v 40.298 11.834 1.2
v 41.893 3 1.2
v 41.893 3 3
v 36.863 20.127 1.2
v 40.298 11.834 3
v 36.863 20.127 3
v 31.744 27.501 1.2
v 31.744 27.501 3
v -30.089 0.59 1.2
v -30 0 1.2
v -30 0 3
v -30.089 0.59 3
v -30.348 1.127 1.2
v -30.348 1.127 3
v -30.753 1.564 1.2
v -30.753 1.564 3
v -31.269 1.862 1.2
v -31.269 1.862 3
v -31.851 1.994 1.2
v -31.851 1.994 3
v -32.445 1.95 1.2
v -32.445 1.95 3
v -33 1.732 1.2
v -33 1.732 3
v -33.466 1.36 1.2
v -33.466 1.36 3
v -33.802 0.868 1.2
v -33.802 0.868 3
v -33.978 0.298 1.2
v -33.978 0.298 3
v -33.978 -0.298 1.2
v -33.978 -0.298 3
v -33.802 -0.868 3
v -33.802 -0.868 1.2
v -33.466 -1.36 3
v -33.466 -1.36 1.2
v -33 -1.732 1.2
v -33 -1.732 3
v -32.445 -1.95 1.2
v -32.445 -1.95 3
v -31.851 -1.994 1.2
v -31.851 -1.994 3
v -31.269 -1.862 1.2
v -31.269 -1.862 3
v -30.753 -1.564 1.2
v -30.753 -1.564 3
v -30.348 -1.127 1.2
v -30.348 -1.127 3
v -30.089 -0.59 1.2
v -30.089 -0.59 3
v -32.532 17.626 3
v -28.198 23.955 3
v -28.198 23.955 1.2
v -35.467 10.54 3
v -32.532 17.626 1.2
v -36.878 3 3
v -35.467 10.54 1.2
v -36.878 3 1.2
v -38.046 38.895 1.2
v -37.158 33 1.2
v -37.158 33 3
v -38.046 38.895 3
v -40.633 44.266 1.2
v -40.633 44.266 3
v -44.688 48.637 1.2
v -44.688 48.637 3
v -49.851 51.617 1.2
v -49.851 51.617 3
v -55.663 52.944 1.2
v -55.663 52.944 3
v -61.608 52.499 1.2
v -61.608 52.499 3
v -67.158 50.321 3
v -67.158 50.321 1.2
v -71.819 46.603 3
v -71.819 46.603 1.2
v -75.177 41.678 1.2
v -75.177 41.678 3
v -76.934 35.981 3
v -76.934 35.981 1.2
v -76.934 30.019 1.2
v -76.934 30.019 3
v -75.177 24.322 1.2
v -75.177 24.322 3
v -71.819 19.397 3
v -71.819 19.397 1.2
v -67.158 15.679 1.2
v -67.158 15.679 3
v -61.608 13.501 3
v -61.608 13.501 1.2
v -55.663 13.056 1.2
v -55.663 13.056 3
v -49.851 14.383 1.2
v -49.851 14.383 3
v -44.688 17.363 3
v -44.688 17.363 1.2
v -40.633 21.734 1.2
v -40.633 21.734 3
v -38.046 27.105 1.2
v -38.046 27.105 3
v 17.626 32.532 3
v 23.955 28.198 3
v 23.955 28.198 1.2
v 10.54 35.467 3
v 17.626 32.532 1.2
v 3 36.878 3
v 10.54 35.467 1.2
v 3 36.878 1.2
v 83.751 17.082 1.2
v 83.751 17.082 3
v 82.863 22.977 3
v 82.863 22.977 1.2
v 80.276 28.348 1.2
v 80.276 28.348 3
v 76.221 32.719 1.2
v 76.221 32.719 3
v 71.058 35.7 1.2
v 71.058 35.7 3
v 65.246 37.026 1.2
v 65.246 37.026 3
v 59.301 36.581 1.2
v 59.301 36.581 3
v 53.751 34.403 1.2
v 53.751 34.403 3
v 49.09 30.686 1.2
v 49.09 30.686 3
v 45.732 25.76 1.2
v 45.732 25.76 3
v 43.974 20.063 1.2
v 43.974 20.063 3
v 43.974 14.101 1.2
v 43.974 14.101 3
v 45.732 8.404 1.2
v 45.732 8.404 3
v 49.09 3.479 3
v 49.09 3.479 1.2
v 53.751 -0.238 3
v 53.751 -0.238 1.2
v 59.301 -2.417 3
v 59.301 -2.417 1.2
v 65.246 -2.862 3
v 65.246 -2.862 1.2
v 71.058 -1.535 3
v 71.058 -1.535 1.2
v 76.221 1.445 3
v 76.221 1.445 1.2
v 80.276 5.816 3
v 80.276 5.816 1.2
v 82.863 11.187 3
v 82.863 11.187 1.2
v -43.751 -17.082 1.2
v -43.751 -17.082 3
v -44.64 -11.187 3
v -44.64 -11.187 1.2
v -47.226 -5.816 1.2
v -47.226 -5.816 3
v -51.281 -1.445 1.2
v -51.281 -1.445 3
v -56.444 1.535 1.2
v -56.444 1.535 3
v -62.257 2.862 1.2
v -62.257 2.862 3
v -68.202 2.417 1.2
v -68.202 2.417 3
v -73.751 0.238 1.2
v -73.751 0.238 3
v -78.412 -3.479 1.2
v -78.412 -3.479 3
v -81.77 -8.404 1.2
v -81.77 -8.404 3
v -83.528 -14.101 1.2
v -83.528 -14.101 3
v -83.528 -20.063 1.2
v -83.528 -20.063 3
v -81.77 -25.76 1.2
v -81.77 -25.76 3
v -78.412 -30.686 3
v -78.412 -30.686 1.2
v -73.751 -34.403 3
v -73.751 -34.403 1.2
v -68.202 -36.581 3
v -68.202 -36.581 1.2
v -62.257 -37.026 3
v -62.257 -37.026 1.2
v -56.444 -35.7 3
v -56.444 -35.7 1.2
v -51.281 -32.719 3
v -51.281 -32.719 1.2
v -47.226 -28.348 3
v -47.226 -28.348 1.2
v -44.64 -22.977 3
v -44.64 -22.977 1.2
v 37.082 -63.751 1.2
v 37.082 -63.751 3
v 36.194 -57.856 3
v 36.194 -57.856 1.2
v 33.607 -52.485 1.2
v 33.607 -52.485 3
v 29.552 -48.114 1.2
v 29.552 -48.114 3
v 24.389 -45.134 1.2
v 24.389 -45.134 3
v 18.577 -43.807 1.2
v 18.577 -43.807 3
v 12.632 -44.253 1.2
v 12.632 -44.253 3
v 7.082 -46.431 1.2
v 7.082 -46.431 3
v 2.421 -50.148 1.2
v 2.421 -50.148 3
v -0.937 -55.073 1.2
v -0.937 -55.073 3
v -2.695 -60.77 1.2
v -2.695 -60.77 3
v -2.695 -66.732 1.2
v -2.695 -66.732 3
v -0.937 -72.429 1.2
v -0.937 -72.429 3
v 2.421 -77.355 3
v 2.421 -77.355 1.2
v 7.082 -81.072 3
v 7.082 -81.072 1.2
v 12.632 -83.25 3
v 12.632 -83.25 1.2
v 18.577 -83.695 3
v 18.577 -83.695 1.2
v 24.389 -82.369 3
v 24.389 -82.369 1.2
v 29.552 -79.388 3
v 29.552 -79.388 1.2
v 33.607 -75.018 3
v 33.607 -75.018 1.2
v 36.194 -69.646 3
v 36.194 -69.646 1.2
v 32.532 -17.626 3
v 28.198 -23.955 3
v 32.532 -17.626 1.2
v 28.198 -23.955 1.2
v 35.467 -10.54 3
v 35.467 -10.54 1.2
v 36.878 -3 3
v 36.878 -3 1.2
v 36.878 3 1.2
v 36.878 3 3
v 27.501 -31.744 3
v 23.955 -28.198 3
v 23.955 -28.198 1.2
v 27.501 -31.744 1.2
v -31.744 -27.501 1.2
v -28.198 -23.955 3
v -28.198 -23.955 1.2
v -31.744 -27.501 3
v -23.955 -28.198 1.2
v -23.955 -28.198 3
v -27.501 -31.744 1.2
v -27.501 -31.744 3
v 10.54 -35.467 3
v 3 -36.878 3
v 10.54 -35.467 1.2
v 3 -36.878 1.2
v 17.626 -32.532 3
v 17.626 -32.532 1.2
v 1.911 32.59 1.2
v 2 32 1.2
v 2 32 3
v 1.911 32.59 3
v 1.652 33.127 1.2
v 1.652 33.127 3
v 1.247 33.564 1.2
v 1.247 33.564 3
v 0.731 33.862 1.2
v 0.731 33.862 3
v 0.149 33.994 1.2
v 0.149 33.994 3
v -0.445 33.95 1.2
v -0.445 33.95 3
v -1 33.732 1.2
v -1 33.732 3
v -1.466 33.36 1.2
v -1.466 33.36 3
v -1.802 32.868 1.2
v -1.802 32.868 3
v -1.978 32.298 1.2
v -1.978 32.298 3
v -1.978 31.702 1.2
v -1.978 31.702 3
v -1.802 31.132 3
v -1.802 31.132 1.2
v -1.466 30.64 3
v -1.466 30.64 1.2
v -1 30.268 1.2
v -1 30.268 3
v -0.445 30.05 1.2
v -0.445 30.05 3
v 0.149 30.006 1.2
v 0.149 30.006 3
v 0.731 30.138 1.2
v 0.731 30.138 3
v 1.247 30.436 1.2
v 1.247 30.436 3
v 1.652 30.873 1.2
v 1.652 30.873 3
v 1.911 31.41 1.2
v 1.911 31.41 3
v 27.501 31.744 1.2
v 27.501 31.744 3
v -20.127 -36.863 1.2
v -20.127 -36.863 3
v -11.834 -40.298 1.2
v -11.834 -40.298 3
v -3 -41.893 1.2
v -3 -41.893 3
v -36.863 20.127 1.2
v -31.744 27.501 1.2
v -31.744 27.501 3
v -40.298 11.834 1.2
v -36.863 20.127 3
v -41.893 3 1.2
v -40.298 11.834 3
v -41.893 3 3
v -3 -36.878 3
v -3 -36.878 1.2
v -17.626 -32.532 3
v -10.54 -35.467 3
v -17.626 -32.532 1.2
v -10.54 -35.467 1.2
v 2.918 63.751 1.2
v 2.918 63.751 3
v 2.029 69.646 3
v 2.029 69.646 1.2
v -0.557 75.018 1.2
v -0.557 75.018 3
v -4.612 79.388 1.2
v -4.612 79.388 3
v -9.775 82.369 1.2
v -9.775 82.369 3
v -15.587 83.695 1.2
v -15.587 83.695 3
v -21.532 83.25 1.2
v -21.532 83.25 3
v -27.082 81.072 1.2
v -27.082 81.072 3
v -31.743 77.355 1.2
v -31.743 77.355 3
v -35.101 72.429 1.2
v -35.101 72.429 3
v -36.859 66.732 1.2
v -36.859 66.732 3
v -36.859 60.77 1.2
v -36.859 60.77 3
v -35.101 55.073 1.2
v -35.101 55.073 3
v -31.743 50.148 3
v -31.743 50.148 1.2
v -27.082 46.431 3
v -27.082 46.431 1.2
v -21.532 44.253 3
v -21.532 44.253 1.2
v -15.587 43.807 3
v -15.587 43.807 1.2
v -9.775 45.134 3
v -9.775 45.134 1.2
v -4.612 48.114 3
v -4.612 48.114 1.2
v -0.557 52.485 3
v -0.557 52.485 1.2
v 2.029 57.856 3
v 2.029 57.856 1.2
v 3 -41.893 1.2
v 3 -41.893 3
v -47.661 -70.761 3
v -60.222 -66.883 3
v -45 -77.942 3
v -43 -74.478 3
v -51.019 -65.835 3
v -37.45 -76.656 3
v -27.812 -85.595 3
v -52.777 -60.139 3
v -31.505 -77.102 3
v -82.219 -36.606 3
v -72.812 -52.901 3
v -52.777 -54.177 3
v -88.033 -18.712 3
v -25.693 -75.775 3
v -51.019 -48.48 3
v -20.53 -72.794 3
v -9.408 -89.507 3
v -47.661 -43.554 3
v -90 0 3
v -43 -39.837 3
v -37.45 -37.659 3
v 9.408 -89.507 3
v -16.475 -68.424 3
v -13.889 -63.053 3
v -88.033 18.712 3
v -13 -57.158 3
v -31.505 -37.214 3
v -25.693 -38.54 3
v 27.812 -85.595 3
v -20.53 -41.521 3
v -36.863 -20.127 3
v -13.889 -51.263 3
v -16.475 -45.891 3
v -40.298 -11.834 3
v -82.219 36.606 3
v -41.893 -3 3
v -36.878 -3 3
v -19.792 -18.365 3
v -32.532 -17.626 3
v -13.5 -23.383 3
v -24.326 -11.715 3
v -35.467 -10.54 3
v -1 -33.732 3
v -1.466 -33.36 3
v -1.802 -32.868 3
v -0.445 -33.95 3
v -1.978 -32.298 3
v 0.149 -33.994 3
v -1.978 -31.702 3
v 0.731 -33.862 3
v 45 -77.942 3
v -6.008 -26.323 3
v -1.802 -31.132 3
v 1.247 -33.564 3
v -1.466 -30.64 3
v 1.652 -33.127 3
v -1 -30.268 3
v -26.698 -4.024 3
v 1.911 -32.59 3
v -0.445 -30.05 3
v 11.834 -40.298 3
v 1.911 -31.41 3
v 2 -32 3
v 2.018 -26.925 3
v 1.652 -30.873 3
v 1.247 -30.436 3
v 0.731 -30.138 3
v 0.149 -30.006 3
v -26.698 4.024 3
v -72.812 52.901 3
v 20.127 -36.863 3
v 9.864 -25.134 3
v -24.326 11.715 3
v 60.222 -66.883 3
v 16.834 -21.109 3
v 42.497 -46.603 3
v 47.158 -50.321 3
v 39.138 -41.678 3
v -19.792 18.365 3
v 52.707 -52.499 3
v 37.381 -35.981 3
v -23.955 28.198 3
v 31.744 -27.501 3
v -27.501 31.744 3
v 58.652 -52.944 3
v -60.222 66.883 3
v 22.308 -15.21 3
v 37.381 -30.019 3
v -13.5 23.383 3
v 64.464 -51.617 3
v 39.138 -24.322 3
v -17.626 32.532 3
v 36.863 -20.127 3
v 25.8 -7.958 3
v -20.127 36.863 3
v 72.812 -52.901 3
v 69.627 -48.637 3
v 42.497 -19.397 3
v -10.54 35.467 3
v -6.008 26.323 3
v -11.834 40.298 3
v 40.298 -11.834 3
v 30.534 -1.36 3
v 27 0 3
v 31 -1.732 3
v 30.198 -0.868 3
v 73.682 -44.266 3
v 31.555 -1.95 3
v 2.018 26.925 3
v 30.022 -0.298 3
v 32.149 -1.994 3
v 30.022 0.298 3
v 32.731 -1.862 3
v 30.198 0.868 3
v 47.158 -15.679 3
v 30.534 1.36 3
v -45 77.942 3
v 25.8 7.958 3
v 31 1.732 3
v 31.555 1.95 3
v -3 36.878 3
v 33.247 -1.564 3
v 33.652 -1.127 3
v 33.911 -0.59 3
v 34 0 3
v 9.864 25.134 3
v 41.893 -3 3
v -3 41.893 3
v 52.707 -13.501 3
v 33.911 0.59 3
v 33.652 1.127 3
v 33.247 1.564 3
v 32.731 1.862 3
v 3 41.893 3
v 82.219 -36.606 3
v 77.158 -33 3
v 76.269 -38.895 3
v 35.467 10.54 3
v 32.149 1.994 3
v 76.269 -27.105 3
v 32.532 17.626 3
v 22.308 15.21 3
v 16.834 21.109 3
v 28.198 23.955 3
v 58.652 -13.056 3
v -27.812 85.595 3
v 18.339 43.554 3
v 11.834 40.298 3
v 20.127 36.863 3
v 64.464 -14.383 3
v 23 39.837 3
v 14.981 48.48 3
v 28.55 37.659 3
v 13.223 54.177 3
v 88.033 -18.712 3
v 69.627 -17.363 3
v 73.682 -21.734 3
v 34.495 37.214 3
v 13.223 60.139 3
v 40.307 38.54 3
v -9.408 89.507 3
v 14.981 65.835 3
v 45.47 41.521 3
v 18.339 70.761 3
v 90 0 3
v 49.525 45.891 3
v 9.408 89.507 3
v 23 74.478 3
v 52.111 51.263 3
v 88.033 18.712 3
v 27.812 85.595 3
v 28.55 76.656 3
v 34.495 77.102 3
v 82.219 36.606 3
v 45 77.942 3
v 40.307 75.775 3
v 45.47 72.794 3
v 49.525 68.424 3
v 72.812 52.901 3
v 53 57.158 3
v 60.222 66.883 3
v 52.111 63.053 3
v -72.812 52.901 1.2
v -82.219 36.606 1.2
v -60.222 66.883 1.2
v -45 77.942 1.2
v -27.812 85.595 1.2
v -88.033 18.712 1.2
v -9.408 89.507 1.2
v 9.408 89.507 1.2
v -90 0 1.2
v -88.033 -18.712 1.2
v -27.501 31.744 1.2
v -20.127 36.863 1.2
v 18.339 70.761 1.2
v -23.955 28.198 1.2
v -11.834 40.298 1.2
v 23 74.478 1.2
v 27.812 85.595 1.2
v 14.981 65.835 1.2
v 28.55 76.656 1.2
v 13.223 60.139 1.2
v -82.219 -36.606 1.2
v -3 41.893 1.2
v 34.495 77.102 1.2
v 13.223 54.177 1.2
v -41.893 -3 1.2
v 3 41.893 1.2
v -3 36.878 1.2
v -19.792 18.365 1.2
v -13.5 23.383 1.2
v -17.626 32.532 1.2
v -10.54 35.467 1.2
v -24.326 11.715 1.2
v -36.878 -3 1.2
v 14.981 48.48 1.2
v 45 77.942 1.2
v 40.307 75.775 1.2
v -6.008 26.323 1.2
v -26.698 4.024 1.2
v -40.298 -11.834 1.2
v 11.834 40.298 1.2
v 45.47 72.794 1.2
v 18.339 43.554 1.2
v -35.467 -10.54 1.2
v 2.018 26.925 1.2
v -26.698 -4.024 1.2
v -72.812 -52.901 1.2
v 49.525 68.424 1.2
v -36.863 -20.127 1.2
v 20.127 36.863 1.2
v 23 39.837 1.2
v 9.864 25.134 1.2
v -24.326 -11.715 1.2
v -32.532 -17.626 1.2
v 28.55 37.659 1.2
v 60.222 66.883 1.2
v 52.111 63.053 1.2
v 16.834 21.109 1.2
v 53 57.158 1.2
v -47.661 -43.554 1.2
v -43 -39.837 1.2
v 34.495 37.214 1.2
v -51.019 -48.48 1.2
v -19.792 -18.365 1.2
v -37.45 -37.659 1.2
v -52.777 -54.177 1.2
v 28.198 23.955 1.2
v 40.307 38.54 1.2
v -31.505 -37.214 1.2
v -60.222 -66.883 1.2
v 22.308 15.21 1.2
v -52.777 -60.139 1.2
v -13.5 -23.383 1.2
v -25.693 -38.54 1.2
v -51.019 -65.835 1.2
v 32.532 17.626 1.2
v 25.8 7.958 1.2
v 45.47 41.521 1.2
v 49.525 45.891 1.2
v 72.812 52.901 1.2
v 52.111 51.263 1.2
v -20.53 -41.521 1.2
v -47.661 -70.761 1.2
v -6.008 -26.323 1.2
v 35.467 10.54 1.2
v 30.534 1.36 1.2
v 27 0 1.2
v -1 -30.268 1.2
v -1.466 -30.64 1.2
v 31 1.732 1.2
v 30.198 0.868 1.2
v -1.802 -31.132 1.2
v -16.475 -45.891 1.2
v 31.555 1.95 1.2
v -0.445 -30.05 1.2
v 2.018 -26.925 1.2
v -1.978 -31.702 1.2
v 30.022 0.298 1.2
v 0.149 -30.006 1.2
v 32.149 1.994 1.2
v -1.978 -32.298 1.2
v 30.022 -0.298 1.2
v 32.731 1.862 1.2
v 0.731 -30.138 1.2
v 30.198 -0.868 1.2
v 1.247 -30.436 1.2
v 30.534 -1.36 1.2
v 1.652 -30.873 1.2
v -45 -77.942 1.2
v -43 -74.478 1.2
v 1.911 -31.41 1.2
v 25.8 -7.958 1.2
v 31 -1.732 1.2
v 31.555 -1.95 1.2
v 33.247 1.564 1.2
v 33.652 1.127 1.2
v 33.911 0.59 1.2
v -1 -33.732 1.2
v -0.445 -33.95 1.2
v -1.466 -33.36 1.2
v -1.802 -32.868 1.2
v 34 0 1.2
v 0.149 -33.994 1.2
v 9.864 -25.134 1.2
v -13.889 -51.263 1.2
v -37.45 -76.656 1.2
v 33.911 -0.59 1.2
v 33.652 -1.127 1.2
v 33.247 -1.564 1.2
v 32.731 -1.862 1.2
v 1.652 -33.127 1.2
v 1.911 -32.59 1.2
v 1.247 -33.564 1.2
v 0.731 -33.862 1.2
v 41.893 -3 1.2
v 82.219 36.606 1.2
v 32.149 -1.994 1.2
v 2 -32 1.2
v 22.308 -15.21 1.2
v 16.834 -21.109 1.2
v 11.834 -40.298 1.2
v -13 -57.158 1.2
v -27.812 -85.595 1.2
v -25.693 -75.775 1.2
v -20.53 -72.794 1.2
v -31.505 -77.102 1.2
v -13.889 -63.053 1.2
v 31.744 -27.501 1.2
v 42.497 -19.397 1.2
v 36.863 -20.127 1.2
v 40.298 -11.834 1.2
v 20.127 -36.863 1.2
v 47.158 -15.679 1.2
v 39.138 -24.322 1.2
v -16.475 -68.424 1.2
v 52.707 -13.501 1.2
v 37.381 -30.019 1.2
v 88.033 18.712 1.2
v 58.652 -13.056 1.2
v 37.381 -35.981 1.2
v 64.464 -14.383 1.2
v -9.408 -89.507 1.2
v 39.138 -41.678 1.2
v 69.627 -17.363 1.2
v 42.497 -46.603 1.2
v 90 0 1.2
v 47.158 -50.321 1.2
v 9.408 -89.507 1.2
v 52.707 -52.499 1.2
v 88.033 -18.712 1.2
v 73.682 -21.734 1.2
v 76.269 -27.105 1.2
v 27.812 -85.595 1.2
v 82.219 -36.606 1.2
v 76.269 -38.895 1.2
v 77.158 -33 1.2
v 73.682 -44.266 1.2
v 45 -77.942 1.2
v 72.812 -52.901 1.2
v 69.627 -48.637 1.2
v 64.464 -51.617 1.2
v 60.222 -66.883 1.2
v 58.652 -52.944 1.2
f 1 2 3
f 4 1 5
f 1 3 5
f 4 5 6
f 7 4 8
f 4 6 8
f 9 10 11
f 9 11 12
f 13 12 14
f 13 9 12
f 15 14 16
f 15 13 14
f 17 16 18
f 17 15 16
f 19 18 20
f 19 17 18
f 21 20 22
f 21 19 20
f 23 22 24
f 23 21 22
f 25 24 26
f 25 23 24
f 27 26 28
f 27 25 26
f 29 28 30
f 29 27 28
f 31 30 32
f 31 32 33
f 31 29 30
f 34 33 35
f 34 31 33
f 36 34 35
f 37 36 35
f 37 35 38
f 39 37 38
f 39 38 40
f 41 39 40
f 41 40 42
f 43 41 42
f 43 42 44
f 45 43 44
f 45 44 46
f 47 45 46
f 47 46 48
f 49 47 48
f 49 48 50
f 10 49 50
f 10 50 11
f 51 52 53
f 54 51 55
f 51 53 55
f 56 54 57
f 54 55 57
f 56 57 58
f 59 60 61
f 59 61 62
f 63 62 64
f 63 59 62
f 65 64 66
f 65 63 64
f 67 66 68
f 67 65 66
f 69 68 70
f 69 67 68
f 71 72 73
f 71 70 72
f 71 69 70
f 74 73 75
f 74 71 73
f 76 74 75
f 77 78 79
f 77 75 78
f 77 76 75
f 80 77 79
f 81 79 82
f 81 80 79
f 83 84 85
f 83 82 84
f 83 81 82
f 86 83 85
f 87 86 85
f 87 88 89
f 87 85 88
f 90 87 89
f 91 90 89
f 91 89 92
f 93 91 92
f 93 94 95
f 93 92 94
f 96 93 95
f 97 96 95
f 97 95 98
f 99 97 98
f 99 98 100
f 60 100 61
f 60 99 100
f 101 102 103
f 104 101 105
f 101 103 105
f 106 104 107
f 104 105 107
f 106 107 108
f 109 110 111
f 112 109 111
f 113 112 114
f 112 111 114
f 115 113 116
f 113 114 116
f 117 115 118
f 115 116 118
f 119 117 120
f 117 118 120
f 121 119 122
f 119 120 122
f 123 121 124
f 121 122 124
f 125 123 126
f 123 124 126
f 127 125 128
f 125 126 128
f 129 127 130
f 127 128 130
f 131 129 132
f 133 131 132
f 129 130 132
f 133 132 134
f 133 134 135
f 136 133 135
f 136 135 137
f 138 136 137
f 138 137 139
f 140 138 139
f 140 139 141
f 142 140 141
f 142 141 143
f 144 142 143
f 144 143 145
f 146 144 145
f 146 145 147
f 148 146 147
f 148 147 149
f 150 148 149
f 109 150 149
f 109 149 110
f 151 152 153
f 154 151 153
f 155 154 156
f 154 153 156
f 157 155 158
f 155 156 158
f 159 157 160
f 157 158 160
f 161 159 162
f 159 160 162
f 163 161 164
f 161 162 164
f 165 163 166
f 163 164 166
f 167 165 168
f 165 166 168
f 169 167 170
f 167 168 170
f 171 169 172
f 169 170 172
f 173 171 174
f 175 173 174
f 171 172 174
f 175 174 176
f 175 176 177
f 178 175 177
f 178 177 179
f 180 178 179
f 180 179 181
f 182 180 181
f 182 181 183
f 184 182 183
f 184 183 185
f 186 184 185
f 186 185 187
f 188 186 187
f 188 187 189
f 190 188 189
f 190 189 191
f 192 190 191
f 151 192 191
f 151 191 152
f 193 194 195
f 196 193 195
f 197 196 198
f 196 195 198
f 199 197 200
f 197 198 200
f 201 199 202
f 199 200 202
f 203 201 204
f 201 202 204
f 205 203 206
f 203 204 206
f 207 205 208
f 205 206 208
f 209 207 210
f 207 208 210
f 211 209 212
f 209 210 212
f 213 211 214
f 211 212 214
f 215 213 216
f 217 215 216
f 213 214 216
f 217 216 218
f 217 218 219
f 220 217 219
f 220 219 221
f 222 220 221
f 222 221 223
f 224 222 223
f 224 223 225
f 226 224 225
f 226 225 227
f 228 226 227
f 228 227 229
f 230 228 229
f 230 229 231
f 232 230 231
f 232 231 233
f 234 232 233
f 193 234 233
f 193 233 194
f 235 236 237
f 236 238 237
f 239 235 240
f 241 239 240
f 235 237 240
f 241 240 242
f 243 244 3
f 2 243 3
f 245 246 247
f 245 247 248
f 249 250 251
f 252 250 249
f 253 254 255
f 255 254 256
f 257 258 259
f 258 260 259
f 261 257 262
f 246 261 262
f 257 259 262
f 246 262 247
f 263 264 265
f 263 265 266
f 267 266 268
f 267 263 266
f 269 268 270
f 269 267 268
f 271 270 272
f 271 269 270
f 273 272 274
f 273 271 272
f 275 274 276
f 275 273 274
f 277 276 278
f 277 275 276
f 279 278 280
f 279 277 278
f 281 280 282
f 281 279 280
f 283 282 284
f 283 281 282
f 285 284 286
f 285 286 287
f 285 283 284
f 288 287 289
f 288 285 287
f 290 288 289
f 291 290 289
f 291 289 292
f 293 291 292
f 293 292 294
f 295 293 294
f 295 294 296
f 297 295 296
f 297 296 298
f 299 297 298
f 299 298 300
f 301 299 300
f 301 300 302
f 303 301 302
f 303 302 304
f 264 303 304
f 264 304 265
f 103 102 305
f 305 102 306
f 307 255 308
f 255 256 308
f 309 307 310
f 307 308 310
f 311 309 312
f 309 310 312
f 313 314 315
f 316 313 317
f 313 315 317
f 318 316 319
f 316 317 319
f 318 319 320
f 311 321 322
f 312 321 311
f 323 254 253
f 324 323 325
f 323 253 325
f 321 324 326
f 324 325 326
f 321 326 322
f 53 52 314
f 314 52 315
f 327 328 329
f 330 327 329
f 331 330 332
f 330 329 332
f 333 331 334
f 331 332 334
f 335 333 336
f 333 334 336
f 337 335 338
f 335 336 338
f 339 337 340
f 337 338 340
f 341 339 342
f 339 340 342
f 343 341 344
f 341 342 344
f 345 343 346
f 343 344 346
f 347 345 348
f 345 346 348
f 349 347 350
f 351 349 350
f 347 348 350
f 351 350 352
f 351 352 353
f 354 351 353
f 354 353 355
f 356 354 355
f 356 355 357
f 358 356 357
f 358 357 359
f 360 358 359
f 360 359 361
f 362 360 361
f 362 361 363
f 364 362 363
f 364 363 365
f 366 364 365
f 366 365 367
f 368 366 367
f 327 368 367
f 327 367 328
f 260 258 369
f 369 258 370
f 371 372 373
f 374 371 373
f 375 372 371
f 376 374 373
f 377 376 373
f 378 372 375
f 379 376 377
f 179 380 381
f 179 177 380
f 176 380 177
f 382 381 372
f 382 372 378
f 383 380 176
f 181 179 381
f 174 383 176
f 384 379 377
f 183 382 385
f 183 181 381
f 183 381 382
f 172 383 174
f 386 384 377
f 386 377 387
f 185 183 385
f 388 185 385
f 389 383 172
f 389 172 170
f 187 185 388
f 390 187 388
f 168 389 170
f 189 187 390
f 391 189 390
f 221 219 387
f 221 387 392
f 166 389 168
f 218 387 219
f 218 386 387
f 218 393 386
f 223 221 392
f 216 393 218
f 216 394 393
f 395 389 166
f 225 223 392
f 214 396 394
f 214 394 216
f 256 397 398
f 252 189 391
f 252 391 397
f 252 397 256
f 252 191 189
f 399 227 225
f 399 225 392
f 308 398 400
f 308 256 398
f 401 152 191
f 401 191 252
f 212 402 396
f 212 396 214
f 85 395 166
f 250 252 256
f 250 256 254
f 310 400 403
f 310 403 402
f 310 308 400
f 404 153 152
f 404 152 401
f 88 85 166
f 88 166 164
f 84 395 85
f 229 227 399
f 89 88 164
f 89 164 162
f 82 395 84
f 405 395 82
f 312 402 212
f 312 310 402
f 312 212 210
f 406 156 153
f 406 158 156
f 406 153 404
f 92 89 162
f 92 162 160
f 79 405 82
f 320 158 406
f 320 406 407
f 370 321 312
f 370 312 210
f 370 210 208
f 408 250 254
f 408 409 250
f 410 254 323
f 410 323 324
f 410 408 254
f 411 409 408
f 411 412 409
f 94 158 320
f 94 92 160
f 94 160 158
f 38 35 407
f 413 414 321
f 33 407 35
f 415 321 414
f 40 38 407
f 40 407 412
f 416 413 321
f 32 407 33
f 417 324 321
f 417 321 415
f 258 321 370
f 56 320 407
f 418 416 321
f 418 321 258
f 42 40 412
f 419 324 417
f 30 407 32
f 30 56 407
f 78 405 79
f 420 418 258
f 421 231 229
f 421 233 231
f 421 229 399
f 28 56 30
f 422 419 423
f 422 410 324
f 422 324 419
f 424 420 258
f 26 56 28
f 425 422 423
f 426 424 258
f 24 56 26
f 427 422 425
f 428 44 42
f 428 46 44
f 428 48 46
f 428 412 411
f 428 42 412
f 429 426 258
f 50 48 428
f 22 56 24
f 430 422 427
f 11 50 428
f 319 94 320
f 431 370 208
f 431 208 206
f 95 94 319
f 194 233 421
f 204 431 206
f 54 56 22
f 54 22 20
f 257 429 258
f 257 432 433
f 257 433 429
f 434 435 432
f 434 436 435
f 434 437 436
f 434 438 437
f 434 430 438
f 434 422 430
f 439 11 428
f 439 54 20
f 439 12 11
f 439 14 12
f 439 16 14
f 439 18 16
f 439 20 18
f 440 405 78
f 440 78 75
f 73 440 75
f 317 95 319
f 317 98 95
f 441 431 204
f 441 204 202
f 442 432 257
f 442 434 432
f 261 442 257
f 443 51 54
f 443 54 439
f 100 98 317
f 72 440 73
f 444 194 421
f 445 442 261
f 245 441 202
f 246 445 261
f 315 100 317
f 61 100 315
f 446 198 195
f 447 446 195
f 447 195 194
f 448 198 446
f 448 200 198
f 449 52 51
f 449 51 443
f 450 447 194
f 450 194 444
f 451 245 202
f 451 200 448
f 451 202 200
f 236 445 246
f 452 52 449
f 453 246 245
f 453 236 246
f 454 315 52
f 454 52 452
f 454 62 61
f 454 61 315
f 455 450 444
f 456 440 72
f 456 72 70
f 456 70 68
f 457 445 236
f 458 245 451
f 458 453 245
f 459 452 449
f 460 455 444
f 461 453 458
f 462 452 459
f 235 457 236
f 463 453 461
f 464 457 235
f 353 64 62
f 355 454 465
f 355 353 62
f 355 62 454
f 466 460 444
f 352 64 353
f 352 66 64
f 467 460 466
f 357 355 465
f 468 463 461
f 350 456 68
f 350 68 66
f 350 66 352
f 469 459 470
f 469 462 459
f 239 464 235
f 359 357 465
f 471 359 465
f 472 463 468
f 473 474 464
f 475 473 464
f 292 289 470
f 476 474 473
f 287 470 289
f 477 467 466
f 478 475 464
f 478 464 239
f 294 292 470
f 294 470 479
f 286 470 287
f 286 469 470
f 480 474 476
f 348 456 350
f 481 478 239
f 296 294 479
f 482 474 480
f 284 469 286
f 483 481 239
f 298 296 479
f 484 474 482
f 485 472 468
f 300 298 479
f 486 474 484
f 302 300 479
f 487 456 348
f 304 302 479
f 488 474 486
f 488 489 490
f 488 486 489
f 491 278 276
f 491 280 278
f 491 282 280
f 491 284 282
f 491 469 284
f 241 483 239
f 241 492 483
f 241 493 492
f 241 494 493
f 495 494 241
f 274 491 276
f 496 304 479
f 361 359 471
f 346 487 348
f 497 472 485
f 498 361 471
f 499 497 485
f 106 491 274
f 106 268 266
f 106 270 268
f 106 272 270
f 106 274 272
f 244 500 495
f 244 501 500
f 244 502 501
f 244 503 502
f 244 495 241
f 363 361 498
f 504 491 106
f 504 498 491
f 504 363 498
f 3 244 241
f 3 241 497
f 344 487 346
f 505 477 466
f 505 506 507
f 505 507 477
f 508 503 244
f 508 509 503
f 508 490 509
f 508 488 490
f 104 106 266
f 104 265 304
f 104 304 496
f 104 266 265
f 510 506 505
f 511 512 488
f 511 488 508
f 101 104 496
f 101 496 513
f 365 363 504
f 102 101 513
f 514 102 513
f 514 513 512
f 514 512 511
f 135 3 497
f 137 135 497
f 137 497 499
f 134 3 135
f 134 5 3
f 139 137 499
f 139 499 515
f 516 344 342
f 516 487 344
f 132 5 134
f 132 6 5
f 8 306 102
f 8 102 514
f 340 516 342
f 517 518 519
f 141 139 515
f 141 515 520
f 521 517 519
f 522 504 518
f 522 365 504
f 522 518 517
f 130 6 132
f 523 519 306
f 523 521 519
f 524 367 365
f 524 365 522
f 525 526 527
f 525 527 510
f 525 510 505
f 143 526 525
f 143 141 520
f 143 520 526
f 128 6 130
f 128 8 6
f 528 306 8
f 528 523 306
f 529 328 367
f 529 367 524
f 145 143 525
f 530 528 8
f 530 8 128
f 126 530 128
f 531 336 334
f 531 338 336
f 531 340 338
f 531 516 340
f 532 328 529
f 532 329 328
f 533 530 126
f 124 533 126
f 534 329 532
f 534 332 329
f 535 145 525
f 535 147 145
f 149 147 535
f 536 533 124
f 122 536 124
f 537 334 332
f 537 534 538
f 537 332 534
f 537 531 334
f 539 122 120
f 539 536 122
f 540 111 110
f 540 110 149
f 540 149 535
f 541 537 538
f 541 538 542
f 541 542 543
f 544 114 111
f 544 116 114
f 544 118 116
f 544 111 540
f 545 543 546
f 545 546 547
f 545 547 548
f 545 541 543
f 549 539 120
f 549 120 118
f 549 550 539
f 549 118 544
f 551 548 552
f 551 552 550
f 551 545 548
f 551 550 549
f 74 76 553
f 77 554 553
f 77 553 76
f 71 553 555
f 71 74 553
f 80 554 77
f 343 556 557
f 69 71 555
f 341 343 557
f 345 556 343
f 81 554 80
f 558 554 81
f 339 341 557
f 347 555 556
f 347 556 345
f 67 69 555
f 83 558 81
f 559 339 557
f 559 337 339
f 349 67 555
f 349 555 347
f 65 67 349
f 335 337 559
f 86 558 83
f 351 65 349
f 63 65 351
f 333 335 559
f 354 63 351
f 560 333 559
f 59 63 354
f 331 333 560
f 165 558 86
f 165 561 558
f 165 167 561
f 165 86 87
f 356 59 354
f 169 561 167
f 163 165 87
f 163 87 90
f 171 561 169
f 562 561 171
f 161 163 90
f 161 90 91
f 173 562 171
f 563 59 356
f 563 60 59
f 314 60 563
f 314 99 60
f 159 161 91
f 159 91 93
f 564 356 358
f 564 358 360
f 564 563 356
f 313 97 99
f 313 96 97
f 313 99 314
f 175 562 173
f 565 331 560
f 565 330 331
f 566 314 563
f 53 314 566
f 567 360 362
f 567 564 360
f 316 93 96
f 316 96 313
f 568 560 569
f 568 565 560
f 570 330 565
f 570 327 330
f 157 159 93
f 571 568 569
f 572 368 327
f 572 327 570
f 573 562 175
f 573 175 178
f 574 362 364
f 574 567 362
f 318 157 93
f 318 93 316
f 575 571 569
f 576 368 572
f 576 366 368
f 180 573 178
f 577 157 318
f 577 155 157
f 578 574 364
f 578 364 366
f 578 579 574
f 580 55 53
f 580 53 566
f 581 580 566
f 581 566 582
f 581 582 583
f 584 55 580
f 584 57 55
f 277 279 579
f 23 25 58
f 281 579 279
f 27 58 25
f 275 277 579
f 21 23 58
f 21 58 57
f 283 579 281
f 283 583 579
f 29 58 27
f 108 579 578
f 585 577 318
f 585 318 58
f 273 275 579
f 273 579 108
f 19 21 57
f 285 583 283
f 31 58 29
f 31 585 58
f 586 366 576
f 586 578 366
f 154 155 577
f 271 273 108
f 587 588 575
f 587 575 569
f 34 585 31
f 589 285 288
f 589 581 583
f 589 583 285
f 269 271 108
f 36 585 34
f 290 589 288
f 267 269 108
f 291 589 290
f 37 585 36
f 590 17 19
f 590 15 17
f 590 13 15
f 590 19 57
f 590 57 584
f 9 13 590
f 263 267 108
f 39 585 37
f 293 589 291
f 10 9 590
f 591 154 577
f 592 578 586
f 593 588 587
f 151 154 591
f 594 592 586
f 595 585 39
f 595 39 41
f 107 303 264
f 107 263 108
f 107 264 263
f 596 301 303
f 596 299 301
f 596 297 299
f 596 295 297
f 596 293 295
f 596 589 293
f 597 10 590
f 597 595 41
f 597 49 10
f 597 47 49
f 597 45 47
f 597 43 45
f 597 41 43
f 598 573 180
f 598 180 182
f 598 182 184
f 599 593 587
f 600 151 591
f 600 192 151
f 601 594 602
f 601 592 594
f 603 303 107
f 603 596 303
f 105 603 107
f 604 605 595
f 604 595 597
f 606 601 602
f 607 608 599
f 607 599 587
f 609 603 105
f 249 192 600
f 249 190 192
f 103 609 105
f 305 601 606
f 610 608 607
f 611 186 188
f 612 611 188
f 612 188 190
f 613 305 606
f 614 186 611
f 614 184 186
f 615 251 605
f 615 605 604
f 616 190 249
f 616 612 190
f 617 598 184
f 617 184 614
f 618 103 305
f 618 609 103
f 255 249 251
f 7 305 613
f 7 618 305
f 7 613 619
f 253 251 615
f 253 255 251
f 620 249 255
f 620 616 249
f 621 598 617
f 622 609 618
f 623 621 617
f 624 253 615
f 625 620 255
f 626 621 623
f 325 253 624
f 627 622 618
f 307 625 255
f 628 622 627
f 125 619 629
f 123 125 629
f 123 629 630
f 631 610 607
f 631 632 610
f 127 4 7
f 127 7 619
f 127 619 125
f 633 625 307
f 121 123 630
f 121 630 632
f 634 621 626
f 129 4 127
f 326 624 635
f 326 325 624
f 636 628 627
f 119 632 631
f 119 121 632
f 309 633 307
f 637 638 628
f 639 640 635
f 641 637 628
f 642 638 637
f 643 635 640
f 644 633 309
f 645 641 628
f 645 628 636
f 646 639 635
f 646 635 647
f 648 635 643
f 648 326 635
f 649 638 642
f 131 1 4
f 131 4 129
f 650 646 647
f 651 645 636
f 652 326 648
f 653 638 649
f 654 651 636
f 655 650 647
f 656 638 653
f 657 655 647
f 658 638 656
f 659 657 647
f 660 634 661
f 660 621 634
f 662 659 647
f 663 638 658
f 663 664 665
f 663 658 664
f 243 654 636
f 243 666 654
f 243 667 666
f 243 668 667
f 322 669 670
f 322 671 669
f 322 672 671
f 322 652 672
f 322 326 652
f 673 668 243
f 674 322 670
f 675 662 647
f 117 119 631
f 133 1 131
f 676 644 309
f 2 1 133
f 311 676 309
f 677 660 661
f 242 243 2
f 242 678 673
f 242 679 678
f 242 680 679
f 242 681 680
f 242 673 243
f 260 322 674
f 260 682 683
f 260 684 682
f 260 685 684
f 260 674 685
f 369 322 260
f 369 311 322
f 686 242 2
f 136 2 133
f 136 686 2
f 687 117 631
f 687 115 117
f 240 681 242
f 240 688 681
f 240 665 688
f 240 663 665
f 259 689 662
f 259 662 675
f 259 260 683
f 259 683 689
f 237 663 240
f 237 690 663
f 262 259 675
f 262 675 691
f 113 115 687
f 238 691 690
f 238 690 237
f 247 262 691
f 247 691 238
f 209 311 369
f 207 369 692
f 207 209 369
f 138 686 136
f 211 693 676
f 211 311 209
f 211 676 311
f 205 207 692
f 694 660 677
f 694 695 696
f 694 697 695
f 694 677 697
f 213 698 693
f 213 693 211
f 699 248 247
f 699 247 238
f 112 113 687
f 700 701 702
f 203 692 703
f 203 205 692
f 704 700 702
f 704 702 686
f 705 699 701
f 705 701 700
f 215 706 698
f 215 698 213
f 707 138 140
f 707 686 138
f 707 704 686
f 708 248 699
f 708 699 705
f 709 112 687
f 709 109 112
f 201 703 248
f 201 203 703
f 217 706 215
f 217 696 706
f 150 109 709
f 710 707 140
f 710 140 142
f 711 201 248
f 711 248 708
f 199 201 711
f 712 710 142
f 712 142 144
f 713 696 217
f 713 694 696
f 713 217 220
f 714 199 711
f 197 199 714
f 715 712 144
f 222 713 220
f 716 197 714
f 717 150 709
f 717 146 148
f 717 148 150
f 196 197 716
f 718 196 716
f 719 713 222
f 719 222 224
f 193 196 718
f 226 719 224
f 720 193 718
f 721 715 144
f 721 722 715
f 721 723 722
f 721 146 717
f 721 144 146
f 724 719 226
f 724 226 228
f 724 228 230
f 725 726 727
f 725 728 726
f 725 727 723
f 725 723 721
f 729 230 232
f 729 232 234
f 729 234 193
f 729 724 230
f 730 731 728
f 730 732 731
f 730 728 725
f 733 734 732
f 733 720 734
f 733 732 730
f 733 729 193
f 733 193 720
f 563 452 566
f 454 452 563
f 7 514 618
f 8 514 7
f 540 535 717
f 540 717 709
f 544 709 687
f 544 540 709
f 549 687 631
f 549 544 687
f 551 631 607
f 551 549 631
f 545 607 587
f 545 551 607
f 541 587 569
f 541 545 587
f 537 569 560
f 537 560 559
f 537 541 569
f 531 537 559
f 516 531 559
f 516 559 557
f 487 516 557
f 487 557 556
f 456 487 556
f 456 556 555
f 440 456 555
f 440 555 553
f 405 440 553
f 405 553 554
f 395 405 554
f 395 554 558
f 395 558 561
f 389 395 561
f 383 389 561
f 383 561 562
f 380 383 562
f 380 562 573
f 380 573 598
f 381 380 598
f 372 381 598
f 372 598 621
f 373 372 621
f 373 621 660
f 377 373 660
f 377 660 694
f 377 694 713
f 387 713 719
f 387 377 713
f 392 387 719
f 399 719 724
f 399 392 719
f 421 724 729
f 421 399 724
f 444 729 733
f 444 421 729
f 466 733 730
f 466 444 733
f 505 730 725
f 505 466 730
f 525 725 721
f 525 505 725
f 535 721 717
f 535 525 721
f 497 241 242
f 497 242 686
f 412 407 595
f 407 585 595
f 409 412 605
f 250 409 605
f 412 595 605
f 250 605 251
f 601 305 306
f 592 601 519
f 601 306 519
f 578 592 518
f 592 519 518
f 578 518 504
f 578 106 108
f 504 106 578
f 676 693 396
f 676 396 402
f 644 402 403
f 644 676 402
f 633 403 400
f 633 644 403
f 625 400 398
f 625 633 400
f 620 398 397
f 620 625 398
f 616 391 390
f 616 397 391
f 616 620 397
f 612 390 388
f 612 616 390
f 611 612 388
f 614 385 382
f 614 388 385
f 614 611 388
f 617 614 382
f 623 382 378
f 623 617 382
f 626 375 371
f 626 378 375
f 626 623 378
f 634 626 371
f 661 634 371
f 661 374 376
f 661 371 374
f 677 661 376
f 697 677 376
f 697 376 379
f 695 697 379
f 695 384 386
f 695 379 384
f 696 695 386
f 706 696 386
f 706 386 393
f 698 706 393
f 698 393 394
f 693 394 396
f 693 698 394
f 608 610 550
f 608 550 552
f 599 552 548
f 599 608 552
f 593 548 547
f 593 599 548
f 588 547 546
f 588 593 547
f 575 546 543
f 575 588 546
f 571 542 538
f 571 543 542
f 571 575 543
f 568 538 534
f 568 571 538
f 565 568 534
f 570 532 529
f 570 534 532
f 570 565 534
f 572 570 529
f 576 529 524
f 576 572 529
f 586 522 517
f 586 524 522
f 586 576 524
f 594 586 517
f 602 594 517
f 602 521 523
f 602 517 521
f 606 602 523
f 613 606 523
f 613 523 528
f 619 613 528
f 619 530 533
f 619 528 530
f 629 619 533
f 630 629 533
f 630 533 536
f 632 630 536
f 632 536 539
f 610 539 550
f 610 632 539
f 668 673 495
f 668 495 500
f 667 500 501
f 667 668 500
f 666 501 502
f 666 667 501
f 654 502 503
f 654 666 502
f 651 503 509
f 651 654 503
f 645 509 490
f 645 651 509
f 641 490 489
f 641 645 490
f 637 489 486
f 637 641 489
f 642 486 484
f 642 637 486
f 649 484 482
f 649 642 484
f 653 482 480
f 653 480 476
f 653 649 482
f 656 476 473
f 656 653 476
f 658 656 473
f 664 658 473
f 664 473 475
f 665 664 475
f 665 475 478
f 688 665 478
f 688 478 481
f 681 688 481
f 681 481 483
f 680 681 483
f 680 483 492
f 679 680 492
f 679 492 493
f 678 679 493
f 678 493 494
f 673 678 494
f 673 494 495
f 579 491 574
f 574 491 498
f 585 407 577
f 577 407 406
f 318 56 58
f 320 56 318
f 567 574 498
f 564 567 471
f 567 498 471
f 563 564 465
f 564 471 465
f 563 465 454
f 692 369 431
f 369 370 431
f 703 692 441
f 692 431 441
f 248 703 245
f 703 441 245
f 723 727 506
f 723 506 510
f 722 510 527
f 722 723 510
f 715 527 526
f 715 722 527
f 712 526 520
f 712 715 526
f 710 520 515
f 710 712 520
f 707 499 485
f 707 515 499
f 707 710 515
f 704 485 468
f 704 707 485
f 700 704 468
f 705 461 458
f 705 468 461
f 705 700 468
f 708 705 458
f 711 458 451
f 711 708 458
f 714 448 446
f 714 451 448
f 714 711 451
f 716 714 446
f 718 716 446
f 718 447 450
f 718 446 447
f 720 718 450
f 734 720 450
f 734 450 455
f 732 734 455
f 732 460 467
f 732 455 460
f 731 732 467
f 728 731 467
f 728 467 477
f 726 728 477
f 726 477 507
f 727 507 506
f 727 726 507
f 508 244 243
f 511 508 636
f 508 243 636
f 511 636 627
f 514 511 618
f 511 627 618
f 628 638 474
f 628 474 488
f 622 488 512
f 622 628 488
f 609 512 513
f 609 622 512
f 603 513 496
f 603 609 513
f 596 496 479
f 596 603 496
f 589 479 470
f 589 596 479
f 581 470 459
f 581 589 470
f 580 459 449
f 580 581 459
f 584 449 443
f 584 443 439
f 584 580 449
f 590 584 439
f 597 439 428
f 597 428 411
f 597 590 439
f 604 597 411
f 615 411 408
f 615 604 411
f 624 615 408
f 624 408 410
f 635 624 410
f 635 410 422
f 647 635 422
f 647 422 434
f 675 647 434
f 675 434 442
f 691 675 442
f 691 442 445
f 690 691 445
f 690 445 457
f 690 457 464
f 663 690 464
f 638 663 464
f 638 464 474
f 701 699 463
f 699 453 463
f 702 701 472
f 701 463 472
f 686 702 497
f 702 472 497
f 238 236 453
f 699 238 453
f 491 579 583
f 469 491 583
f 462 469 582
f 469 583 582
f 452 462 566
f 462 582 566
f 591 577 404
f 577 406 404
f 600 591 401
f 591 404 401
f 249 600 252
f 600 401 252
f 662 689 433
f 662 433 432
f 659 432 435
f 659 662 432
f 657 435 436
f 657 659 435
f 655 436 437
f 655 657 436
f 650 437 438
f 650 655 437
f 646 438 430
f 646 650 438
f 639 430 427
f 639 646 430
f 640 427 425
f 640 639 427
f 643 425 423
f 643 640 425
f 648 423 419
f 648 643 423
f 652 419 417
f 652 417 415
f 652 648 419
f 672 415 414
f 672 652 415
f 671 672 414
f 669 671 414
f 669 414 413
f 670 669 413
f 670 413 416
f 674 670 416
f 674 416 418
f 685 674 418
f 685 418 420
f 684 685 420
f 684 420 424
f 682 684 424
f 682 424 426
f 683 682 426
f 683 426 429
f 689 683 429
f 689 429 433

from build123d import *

# Parameters (mm, degrees)
SKETCH_1_R               = 37
SKETCH_1_R_2             = 2
SKETCH_1_R_3             = 27
EXTRUDE_1_DEPTH          = 3
SKETCH_2_R               = 90
SKETCH_2_R_2             = 20
SKETCH_2_R_3             = 42
EXTRUDE_2_DEPTH          = 3
EXTRUDE_3_DEPTH          = 3
CUT_EXTRUDE_1_DEPTH      = 128.314571044
CUT_EXTRUDE_1_DEPTH_BACK = 128.314571044
SKETCH_5_R               = 20
CUT_EXTRUDE_2_DEPTH      = 128.314571044
CUT_EXTRUDE_2_DEPTH_BACK = 128.314571044


with BuildPart() as part:
    # 草图1 → 凸台-拉伸1 (new body)
    with BuildSketch(Plane.XY):
        Circle(SKETCH_1_R)
        with Locations((-32, 0)):
            Circle(SKETCH_1_R_2, mode=Mode.SUBTRACT)
        with Locations((0, 32)):
            Circle(SKETCH_1_R_2, mode=Mode.SUBTRACT)
        with Locations((32, 0)):
            Circle(SKETCH_1_R_2, mode=Mode.SUBTRACT)
        with Locations((0, -32)):
            Circle(SKETCH_1_R_2, mode=Mode.SUBTRACT)
        Circle(SKETCH_1_R_3, mode=Mode.SUBTRACT)
    extrude(amount=EXTRUDE_1_DEPTH)



with BuildPart() as body_2:
    # 草图2 → 凸台-拉伸2 (new body)
    with BuildSketch(Plane.XY.offset(3)):
        Circle(SKETCH_2_R)
        with Locations((-63.751104535, -17.082056977)):
            Circle(SKETCH_2_R_2, mode=Mode.SUBTRACT)
        with Locations((-17.082056977, 63.751104535)):
            Circle(SKETCH_2_R_2, mode=Mode.SUBTRACT)
        with Locations((63.751104535, 17.082056977)):
            Circle(SKETCH_2_R_2, mode=Mode.SUBTRACT)
        with Locations((17.082056977, -63.751104535)):
            Circle(SKETCH_2_R_2, mode=Mode.SUBTRACT)
        Circle(SKETCH_2_R_3, mode=Mode.SUBTRACT)
    extrude(amount=-EXTRUDE_2_DEPTH)


with BuildPart() as part_1:
    add(part.part)

    add(body_2.part)  # 凸台-拉伸3 merges body 2
    # 草图3 → 凸台-拉伸3 (add)
    with BuildSketch(Plane.XY.offset(3)):
        Polygon((-41.892720131, 3), (-34.060564973, 3), (-34.060564973, -3), (-43.204810996, -3), (-43.204810996, 3), align=None)
        Polygon((-28.429094491, 32.671735178), (-27.501306144, 31.743946831), (-21.96313612, 26.205776807), (-26.205776807, 21.96313612), (-32.671735178, 28.429094491), align=None)
        Polygon((3, 43.204810996), (3, 41.892720131), (3, 34.060564973), (-3, 34.060564973), (-3, 43.204810996), align=None)
        Polygon((32.671735178, 28.429094491), (31.743946831, 27.501306144), (26.205776807, 21.96313612), (21.96313612, 26.205776807), (28.429094491, 32.671735178), align=None)
        Polygon((43.204810996, -3), (41.892720131, -3), (34.060564973, -3), (34.060564973, 3), (43.204810996, 3), align=None)
        Polygon((28.429094491, -32.671735178), (27.501306144, -31.743946831), (21.96313612, -26.205776807), (26.205776807, -21.96313612), (32.671735178, -28.429094491), align=None)
        Polygon((-3, -43.204810996), (-3, -41.892720131), (-3, -34.060564973), (3, -34.060564973), (3, -43.204810996), align=None)
        Polygon((-32.671735178, -28.429094491), (-31.743946831, -27.501306144), (-26.205776807, -21.96313612), (-21.96313612, -26.205776807), (-28.429094491, -32.671735178), align=None)
    extrude(amount=-EXTRUDE_3_DEPTH)

    # 草图5 → 切除-拉伸1 (cut, two sides: drawn at the far end of the back side and taken through both)
    with BuildSketch(Plane.XY.offset(3).offset(-CUT_EXTRUDE_1_DEPTH_BACK)):
        with Locations((-57.15767665, 33)):
            Circle(SKETCH_5_R)
        with Locations((33, 57.15767665)):
            Circle(SKETCH_5_R)
        with Locations((57.15767665, -33)):
            Circle(SKETCH_5_R)
        with Locations((-33, -57.15767665)):
            Circle(SKETCH_5_R)
    extrude(amount=CUT_EXTRUDE_1_DEPTH + CUT_EXTRUDE_1_DEPTH_BACK, mode=Mode.SUBTRACT)

    # 草图6 → 切除-拉伸2 (cut, two sides: drawn at the far end of the back side and taken through both)
    with BuildSketch(Plane(origin=(0, 0, 0), x_dir=(1, 0, 0), z_dir=(0, 1, 0)).offset(-CUT_EXTRUDE_2_DEPTH_BACK)):
        Polygon((100.374072396, 28.225781081), (-90, 7.369193783), (-90, 0), (-90, -1.2), (96.19546412, -1.2), align=None)
    extrude(amount=CUT_EXTRUDE_2_DEPTH + CUT_EXTRUDE_2_DEPTH_BACK, mode=Mode.SUBTRACT)


solid = part_1.part
